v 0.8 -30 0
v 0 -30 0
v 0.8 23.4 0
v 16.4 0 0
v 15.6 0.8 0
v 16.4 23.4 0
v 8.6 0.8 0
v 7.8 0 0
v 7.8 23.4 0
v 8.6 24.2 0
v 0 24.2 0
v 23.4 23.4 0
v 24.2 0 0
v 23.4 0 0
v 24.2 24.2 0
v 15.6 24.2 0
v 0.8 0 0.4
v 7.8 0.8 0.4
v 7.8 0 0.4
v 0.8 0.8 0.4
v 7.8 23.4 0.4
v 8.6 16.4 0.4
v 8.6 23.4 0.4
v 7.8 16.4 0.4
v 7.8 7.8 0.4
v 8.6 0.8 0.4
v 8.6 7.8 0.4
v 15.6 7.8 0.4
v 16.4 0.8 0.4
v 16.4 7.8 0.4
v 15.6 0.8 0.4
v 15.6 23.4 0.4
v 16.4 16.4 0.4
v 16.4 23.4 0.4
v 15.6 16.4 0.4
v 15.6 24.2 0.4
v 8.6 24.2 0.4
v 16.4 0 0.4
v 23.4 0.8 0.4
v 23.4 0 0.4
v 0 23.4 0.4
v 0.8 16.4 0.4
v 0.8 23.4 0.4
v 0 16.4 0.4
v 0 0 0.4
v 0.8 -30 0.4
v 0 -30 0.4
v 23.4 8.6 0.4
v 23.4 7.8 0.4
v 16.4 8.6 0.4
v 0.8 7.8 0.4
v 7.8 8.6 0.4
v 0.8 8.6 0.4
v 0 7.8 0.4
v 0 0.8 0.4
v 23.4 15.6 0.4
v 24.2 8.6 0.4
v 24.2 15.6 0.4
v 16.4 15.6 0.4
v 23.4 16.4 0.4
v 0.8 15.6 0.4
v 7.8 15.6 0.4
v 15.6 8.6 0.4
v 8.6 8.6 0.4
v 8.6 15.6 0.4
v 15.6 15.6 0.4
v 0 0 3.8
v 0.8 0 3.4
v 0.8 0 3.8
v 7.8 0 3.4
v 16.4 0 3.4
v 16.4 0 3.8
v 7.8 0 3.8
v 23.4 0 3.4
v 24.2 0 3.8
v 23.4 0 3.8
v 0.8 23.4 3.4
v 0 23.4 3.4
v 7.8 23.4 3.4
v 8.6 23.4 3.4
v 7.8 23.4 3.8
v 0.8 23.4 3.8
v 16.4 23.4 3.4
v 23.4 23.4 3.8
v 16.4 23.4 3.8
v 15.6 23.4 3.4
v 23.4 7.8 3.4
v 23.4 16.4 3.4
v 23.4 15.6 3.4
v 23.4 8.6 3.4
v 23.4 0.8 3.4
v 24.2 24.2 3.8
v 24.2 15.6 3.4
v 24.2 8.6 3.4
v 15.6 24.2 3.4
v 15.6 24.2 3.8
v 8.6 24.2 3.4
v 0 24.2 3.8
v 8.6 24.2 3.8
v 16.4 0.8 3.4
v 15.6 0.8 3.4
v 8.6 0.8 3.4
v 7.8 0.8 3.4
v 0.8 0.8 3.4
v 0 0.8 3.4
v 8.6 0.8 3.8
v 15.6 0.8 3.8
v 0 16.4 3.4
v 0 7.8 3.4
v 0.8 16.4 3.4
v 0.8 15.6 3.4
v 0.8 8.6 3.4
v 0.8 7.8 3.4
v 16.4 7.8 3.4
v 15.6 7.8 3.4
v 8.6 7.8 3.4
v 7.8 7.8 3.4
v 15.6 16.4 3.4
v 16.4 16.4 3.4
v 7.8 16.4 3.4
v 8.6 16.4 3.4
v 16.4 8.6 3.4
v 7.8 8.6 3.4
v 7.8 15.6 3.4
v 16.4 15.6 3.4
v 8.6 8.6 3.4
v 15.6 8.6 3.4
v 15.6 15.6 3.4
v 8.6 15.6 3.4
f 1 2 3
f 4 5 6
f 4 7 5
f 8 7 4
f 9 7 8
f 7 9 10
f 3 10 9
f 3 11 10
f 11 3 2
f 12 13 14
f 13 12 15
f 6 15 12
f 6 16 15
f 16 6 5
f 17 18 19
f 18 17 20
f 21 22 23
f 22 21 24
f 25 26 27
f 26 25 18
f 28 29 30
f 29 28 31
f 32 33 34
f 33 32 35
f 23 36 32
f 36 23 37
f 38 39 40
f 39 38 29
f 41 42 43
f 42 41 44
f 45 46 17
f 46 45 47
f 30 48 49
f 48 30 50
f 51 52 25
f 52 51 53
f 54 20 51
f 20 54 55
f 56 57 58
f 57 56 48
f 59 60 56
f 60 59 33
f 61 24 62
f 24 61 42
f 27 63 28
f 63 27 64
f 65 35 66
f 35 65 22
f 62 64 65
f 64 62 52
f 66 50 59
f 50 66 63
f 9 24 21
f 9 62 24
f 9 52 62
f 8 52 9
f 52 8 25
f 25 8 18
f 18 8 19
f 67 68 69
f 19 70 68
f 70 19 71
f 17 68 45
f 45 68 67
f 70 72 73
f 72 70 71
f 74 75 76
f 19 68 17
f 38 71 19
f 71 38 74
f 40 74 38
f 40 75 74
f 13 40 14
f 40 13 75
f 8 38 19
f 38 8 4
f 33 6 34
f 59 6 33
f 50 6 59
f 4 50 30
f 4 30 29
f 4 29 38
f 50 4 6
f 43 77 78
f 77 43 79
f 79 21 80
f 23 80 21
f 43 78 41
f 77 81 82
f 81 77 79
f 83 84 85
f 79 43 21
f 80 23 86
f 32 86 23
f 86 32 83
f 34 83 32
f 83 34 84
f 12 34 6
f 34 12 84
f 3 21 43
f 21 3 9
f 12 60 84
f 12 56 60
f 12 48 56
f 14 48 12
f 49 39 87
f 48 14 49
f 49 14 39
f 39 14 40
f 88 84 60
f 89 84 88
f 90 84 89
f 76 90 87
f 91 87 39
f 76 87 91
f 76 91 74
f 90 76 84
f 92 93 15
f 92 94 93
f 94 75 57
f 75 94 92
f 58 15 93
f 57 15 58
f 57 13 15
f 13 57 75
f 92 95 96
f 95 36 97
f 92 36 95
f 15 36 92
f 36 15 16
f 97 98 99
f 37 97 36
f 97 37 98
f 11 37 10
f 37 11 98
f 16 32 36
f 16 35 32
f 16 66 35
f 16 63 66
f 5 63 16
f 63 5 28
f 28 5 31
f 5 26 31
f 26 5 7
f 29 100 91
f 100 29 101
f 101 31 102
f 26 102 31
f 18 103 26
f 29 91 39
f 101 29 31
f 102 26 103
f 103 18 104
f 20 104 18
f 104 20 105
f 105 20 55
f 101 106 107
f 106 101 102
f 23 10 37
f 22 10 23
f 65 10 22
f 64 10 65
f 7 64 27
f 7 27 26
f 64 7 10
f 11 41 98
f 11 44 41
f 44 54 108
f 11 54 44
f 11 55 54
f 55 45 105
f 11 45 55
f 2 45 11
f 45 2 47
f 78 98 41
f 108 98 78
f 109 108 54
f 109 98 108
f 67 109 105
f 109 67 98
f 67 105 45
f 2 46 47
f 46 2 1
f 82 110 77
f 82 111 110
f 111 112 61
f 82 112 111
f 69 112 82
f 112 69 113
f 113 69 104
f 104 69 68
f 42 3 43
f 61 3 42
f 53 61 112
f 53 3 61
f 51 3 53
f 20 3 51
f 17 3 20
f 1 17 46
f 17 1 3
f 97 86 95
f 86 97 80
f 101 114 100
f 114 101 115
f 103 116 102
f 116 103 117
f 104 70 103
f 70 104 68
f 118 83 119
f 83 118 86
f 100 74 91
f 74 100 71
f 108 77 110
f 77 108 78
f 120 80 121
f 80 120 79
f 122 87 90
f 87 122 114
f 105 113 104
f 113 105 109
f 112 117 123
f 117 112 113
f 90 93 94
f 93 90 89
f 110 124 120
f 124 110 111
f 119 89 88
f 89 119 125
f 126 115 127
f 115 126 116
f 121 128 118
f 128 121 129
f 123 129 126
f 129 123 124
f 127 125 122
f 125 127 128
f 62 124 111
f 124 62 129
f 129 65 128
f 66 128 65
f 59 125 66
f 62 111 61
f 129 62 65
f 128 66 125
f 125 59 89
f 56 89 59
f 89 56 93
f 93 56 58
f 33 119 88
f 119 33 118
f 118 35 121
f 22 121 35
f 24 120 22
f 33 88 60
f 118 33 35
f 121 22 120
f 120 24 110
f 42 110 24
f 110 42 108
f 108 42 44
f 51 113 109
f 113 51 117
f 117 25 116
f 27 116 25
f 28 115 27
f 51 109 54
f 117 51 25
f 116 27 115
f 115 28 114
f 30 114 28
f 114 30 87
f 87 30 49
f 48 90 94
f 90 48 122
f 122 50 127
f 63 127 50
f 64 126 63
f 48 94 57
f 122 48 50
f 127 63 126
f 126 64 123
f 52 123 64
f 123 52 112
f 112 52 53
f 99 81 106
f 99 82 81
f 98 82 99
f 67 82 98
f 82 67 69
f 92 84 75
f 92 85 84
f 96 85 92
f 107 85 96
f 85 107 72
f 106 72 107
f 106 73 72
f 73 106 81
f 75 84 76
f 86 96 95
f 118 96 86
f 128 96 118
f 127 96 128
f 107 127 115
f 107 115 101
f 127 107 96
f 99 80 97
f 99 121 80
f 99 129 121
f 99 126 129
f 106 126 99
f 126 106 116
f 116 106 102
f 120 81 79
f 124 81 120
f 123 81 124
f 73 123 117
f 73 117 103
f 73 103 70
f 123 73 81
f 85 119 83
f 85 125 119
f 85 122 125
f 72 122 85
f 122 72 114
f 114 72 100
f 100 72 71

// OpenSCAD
// file: ../../api/v3/reporting.scad
//////////////////////////////////////////////////////////////////////
// LibFile: reporting.scad
// Project: Grid Stack
// FileGroup: API v3 Reporting
// FileSummary: Console report for immutable direct and positive-gap coupons.
// Role: Records the exact environment, dimensions, support strategy, path
//       lengths, qualification status, and deposited-layer counts.
// Requires: API v3 indexes, mathematics, and path generator.
// Exports: report_structural_coupon_object().
//////////////////////////////////////////////////////////////////////

function _bridge_status3(span, process) =
    span <= process[PX3_BRIDGE_MAX]
        ? "within_owner_tested_limit"
        : "exploratory_beyond_owner_tested_limit";

module report_structural_coupon_object(object, report_level = "full") {
    material = object[SCO_MATERIAL];
    nozzle = object[SCO_NOZZLE];
    printer = object[SCO_PRINTER];
    process = object[SCO_PROCESS];
    boundary = object[SCO_BOUNDARY];
    gap = object[SCO_CLEAR_GAP];
    strategy = object[SCO_SUPPORT_STRATEGY];

    echo("--- Grid Stack immutable structural coupon ---");
    echo(str("Object: ", object[SCO_NAME], " revision ", object[SCO_REVISION]));
    echo(str("API/schema: ", object[SCO_REQUIRED_API], "/",
        object[SCO_SCHEMA_VERSION]));
    echo(str("Release/base commit: ", object[SCO_SOURCE_RELEASE], " / ",
        object[SCO_FRAMEWORK_BASE_COMMIT]));
    echo(str("Material/nozzle/printer: ", material[MAT3_FAMILY], " / ",
        nozzle[NZ3_DIAMETER], " mm / ", printer[PRN3_NAME]));
    echo(str("Cells: ", boundary[B3_CELLS_X], " x ", boundary[B3_CELLS_Y]));
    echo(str("Clear spans: ", boundary[B3_CLEAR_SPAN_X], " x ",
        boundary[B3_CLEAR_SPAN_Y], " mm"));
    echo(str("Span status: ",
        _bridge_status3(boundary[B3_CLEAR_SPAN_X], process)));
    echo(str("Outside size: ", boundary_size_x3(boundary, process, nozzle),
        " x ", boundary_size_y3(boundary, process, nozzle), " mm"));
    echo(str("Primitive trace: ", trace_width3(nozzle), " x ",
        trace_height3(process), " mm"));
    echo(str("Structural strand: ", strand_width3(process, nozzle), " x ",
        strand_height3(process), " mm"));
    echo(str("Clear vertical gap: ", gap, " mm"));
    echo(str("Support strategy: ", strategy));
    echo(str("Total modeled height: ", coupon_total_height3(object), " mm"));

    if (report_level == "full") {
        if (strategy == "direct_orthogonal") {
            lower = coupon_path(
                boundary, process, nozzle, 0, object[SCO_LEAD_IN]
            );
            upper = coupon_path(boundary, process, nozzle, 90, 0);
            echo(str("Lower/upper path lengths: ", path_length3(lower),
                " / ", path_length3(upper), " mm"));
            echo(str("Deposited layers: ", 2 * process[PX3_HEIGHT_PASSES]));
        }
        else {
            witness = coupon_path(
                boundary, process, nozzle, 90, object[SCO_LEAD_IN]
            );
            riser = coupon_path(boundary, process, nozzle, 0, 0);
            test = coupon_path(boundary, process, nozzle, 90, 0);
            echo(str("Witness/riser/test path lengths: ",
                path_length3(witness), " / ", path_length3(riser), " / ",
                path_length3(test), " mm"));
            echo(str("Riser deposited layers: ", round(gap_layer_count3(object))));
            echo(str("Total deposited layers: ",
                2 * process[PX3_HEIGHT_PASSES] +
                round(gap_layer_count3(object))));
        }
        echo(str("Status: ", object[SCO_STATUS]));
        echo(str("Notes: ", object[SCO_NOTES]));
    }
}
// file: ../../api/v3/validation.scad
//////////////////////////////////////////////////////////////////////
// LibFile: validation.scad
// Project: Grid Stack
// FileGroup: API v3 Validation
// FileSummary: Validates immutable environment records, count boundaries,
//              support strategy, path continuity, and layer quantization.
// Role: Rejects incompatible or physically floating recipes before geometry
//       is generated.
// Requires: API v3 indexes, mathematics, and path generator.
// Exports: validate_structural_coupon_object().
//////////////////////////////////////////////////////////////////////

module _validate_path3(points, boundary, orientation, lead_in) {
    run_count = orientation == 0
        ? boundary_strand_count_y3(boundary)
        : boundary_strand_count_x3(boundary);

    assert(len(points) == expected_coupon_point_count3(run_count, lead_in),
        "API v3 coupon path has an unexpected point count.");
    assert(!path_has_zero_segment3(points),
        "API v3 coupon path contains a zero-length segment.");
    assert(path_axis_aligned3(points),
        "API v3 coupon path must remain axis-aligned.");
    assert(points[0] != points[len(points) - 1],
        "API v3 coupon path must remain open.");
}

module validate_structural_coupon_object(object) {
    assert(object[SCO_REQUIRED_API] == GRID_STACK_API_VERSION,
        "Saved coupon requires a different Grid Stack API version.");
    assert(object[SCO_SCHEMA_VERSION] == GRID_STACK_COUPON_SCHEMA_VERSION,
        "Saved coupon requires a different coupon schema version.");
    assert(GRID_STACK_RECTANGULAR_FRAMEWORK_VERSION == 2,
        "Saved coupon requires rectangular framework version 2.");

    material = object[SCO_MATERIAL];
    nozzle = object[SCO_NOZZLE];
    printer = object[SCO_PRINTER];
    process = object[SCO_PROCESS];
    boundary = object[SCO_BOUNDARY];
    gap = object[SCO_CLEAR_GAP];
    lead_in = object[SCO_LEAD_IN];
    strategy = object[SCO_SUPPORT_STRATEGY];

    assert(nozzle[NZ3_DIAMETER] > 0,
        "Saved coupon nozzle diameter must be positive.");
    assert(process[PX3_LAYER_H] > 0,
        "Saved coupon layer height must be positive.");
    assert(process[PX3_WIDTH_PASSES] >= 2,
        "Saved coupon structural width requires at least two passes.");
    assert(process[PX3_HEIGHT_PASSES] >= 2,
        "Saved coupon structural height requires at least two layers.");
    assert(process[PX3_MATERIAL] == material[MAT3_NAME],
        "Saved coupon process/material references do not match.");
    assert(process[PX3_NOZZLE] == nozzle[NZ3_NAME],
        "Saved coupon process/nozzle references do not match.");
    assert(process[PX3_PRINTER] == printer[PRN3_NAME],
        "Saved coupon process/printer references do not match.");
    assert(boundary[B3_CELLS_X] > 0 && boundary[B3_CELLS_Y] > 0,
        "Saved coupon cell counts must be positive.");
    assert(boundary[B3_CLEAR_SPAN_X] > 0 &&
           boundary[B3_CLEAR_SPAN_Y] > 0,
        "Saved coupon clear spans must be positive.");
    assert(lead_in >= 0,
        "Saved coupon lead-in cannot be negative.");
    assert(gap >= 0,
        "Saved coupon clear gap cannot be negative.");
    assert(nearly_equal3(gap_layer_count3(object), round(gap_layer_count3(object))),
        "Saved coupon clear gap must equal a whole deposited-layer count.");
    assert(
        (strategy == "direct_orthogonal" && nearly_equal3(gap, 0)) ||
        (strategy == "witness_riser_bridge" && gap > 0),
        "Saved coupon support strategy does not match its clear gap."
    );

    if (strategy == "direct_orthogonal") {
        lower = coupon_path(boundary, process, nozzle, 0, lead_in);
        upper = coupon_path(boundary, process, nozzle, 90, 0);
        _validate_path3(lower, boundary, 0, lead_in);
        _validate_path3(upper, boundary, 90, 0);
        entry = lead_in > 0 ? 1 : 0;
        assert(nearly_equal3(point_distance_2d3(lower[entry], upper[0]), 0),
            "Direct upper path must start on the lower entry crossing.");
    }
    else {
        witness = coupon_path(boundary, process, nozzle, 90, lead_in);
        riser = coupon_path(boundary, process, nozzle, 0, 0);
        test = coupon_path(boundary, process, nozzle, 90, 0);
        _validate_path3(witness, boundary, 90, lead_in);
        _validate_path3(riser, boundary, 0, 0);
        _validate_path3(test, boundary, 90, 0);
        entry = lead_in > 0 ? 1 : 0;
        assert(nearly_equal3(point_distance_2d3(witness[entry], riser[0]), 0),
            "Riser path must start on the witness entry crossing.");
        assert(nearly_equal3(point_distance_2d3(riser[0], test[0]), 0),
            "Upper test path must start on the riser entry crossing.");
        for (i = [0 : len(test) - 1])
            assert(nearly_equal3(point_distance_2d3(test[i], witness[i + entry]), 0),
                "Upper test path must align directly above the witness path.");
    }

    echo("GRID STACK API V3 COUPON VALIDATION: PASS");
}
// file: ../../api/v3/geometry.scad
//////////////////////////////////////////////////////////////////////
// LibFile: geometry.scad
// Project: Grid Stack
// FileGroup: API v3 Printable Geometry
// FileSummary: Creates square-ended structural paths, direct-contact coupons,
//              positive witness/riser/bridge coupons, and simple diagnostics.
// Role: Supplies all geometry used by immutable API v3 recipes without
//       importing mutable workbench geometry.
// Requires: API v3 mathematics and ordered axis-aligned paths.
// Exports: render_direct_coupon(), render_positive_gap_coupon(), and
//          render_coupon_path_debug().
//////////////////////////////////////////////////////////////////////

module _segment_2d3(a, b, width) {
    horizontal = nearly_equal3(a[1], b[1]);
    vertical = nearly_equal3(a[0], b[0]);

    assert(horizontal || vertical,
        "API v3 printable segments must be horizontal or vertical.");
    assert(!nearly_equal3(point_distance_2d3(a, b), 0),
        "API v3 printable segments must have nonzero length.");

    if (horizontal)
        translate([min(a[0], b[0]) - width / 2, a[1] - width / 2])
            square([abs(b[0] - a[0]) + width, width]);
    else
        translate([a[0] - width / 2, min(a[1], b[1]) - width / 2])
            square([width, abs(b[1] - a[1]) + width]);
}

module _path_2d3(points, width) {
    union()
        for (i = [0 : len(points) - 2])
            _segment_2d3(points[i], points[i + 1], width);
}

module _structural_path3(points, process, nozzle) {
    linear_extrude(height = strand_height3(process), convexity = 10)
        _path_2d3(points, strand_width3(process, nozzle));
}

module render_direct_coupon(lower, upper, process, nozzle) {
    union() {
        _structural_path3(lower, process, nozzle);
        translate([0, 0, strand_height3(process)])
            _structural_path3(upper, process, nozzle);
    }
}

module render_positive_gap_coupon(
    witness, riser, test, process, nozzle, clear_gap
) {
    union() {
        _structural_path3(witness, process, nozzle);

        translate([0, 0, strand_height3(process)])
            linear_extrude(height = clear_gap, convexity = 10)
                _path_2d3(riser, strand_width3(process, nozzle));

        translate([0, 0, strand_height3(process) + clear_gap])
            _structural_path3(test, process, nozzle);
    }
}

module _debug_path3(points, z, width) {
    translate([0, 0, z])
        linear_extrude(height = 0.04)
            _path_2d3(points, width);
}

module render_coupon_path_debug(
    lower, upper, riser, process, clear_gap = 0
) {
    width = max(0.12, trace_height3(process));
    _debug_path3(lower, 0, width);
    if (len(riser) > 0)
        _debug_path3(riser, strand_height3(process), width);
    _debug_path3(
        upper,
        strand_height3(process) + clear_gap,
        width
    );
}
// file: ../../api/v3/paths.scad
//////////////////////////////////////////////////////////////////////
// LibFile: paths.scad
// Project: Grid Stack
// FileGroup: API v3 Path Generation
// FileSummary: Generates one open rectangular serpentine centerline from a
//              count boundary for X- or Y-running structural paths.
// Role: Preserves parallel runs, square connectors, optional single lead-in,
//       and one uninterrupted ordered point list per deposited layer.
// Requires: API v3 indexes and mathematics.
// Exports: coupon_path() and expected_coupon_point_count3().
//////////////////////////////////////////////////////////////////////

function _x_rows3(row, count, x_min, x_max, y_min, pitch) =
    row >= count
        ? []
        : let(
            y = y_min + row * pitch,
            x_end = row % 2 == 0 ? x_max : x_min,
            row_end = [x_end, y],
            connector_end = [x_end, y + pitch]
        )
        concat(
            [row_end],
            row < count - 1 ? [connector_end] : [],
            _x_rows3(row + 1, count, x_min, x_max, y_min, pitch)
        );

function _y_columns3(column, count, x_min, y_min, y_max, pitch) =
    column >= count
        ? []
        : let(
            x = x_min + column * pitch,
            y_end = column % 2 == 0 ? y_max : y_min,
            column_end = [x, y_end],
            connector_end = [x + pitch, y_end]
        )
        concat(
            [column_end],
            column < count - 1 ? [connector_end] : [],
            _y_columns3(column + 1, count, x_min, y_min, y_max, pitch)
        );

function expected_coupon_point_count3(run_count, lead_in = 0) =
    2 * run_count + (lead_in > 0 ? 1 : 0);

function coupon_path(
    boundary, process, nozzle, orientation = 0, lead_in = 0
) =
    assert(orientation == 0 || orientation == 90,
        "API v3 coupon orientation must be 0 or 90 degrees.")
    assert(lead_in >= 0,
        "API v3 coupon lead-in cannot be negative.")
    let(
        width = strand_width3(process, nozzle),
        x_min = width / 2,
        y_min = width / 2,
        x_max = boundary_size_x3(boundary, process, nozzle) - width / 2,
        y_max = boundary_size_y3(boundary, process, nozzle) - width / 2,
        entry = [x_min, y_min],
        prefix = lead_in > 0
            ? (orientation == 0
                ? [[x_min - lead_in, y_min], entry]
                : [[x_min, y_min - lead_in], entry])
            : [entry]
    )
    orientation == 0
        ? concat(
            prefix,
            _x_rows3(
                0, boundary_strand_count_y3(boundary),
                x_min, x_max, y_min,
                boundary_pitch_y3(boundary, process, nozzle)
            )
        )
        : concat(
            prefix,
            _y_columns3(
                0, boundary_strand_count_x3(boundary),
                x_min, y_min, y_max,
                boundary_pitch_x3(boundary, process, nozzle)
            )
        );
// file: ../../api/v3/math.scad
//////////////////////////////////////////////////////////////////////
// LibFile: math.scad
// Project: Grid Stack
// FileGroup: API v3 Mathematics
// FileSummary: Pure trace, strand, boundary, path, and layer-count helpers.
// Role: Keeps API v3 calculations isolated and reproducible without importing
//       mutable workbench mathematics.
// Requires: API v3 indexes.
// Exports: nearly_equal3(), trace/strand dimensions, boundary dimensions,
//          path inspection, gap-layer count, and total-height helpers.
//////////////////////////////////////////////////////////////////////

function nearly_equal3(a, b, epsilon = 0.000001) = abs(a - b) <= epsilon;

function trace_width3(nozzle) = nozzle[NZ3_DIAMETER];
function trace_height3(process) = process[PX3_LAYER_H];
function strand_width3(process, nozzle) =
    trace_width3(nozzle) * process[PX3_WIDTH_PASSES];
function strand_height3(process) =
    trace_height3(process) * process[PX3_HEIGHT_PASSES];

function boundary_strand_count_x3(boundary) = boundary[B3_CELLS_X] + 1;
function boundary_strand_count_y3(boundary) = boundary[B3_CELLS_Y] + 1;
function boundary_pitch_x3(boundary, process, nozzle) =
    boundary[B3_CLEAR_SPAN_X] + strand_width3(process, nozzle);
function boundary_pitch_y3(boundary, process, nozzle) =
    boundary[B3_CLEAR_SPAN_Y] + strand_width3(process, nozzle);
function boundary_size_x3(boundary, process, nozzle) =
    boundary[B3_CELLS_X] * boundary[B3_CLEAR_SPAN_X] +
    boundary_strand_count_x3(boundary) * strand_width3(process, nozzle);
function boundary_size_y3(boundary, process, nozzle) =
    boundary[B3_CELLS_Y] * boundary[B3_CLEAR_SPAN_Y] +
    boundary_strand_count_y3(boundary) * strand_width3(process, nozzle);

function point_distance_2d3(a, b) =
    sqrt(pow(b[0] - a[0], 2) + pow(b[1] - a[1], 2));
function path_length3(points, i = 0) =
    i >= len(points) - 1
        ? 0
        : point_distance_2d3(points[i], points[i + 1]) +
          path_length3(points, i + 1);
function path_has_zero_segment3(points, i = 0) =
    i >= len(points) - 1
        ? false
        : nearly_equal3(point_distance_2d3(points[i], points[i + 1]), 0)
            ? true
            : path_has_zero_segment3(points, i + 1);
function segment_axis_aligned3(a, b) =
    nearly_equal3(a[0], b[0]) || nearly_equal3(a[1], b[1]);
function path_axis_aligned3(points, i = 0) =
    i >= len(points) - 1
        ? true
        : segment_axis_aligned3(points[i], points[i + 1]) &&
          path_axis_aligned3(points, i + 1);

function gap_layer_count3(object) =
    object[SCO_CLEAR_GAP] / trace_height3(object[SCO_PROCESS]);
function coupon_total_height3(object) =
    2 * strand_height3(object[SCO_PROCESS]) + object[SCO_CLEAR_GAP];
// file: ../../api/v3/schema.scad
//////////////////////////////////////////////////////////////////////
// LibFile: schema.scad
// Project: Grid Stack
// FileGroup: API v3 Data Model
// FileSummary: Constructors for self-contained immutable structural coupons.
// Role: Makes every geometry-affecting environment and object value explicit
//       inside the saved recipe rather than resolving mutable catalog names.
// Exports: material_spec(), nozzle_spec(), printer_spec(),
//          structural_process_profile(), count_boundary(), and
//          structural_coupon_object().
//////////////////////////////////////////////////////////////////////

function material_spec(
    name, family, flexibility, status = "in_use", notes = ""
) = [name, family, flexibility, status, notes];

function nozzle_spec(
    name, diameter, construction = "brass", status = "in_use", notes = ""
) = [name, diameter, construction, status, notes];

function printer_spec(
    name,
    manufacturer = "",
    model = "",
    motion_system = "",
    build_surface = "",
    status = "unrecorded",
    notes = ""
) = [
    name, manufacturer, model, motion_system,
    build_surface, status, notes
];

function structural_process_profile(
    name,
    material_name,
    nozzle_name,
    printer_name,
    layer_height,
    width_passes,
    height_passes,
    bridge_max,
    qualification,
    revision,
    notes = ""
) = [
    name, material_name, nozzle_name, printer_name,
    layer_height, width_passes, height_passes, bridge_max,
    qualification, revision, notes
];

// Function: count_boundary()
// Synopsis: Stores clear-opening counts and clear spans for one rectangle.
function count_boundary(
    name,
    cells_x,
    cells_y,
    clear_span_x,
    clear_span_y,
    notes = ""
) = [name, cells_x, cells_y, clear_span_x, clear_span_y, notes];

// Function: structural_coupon_object()
// Synopsis: Constructs one permanent coupon recipe.
// Description:
//   framework_base_commit records the last accepted repository state used to
//   begin the API implementation. The Git commit containing this recipe is the
//   authoritative complete source; a file cannot embed its own future hash.
function structural_coupon_object(
    name,
    revision,
    required_api_version,
    coupon_schema_version,
    source_release,
    framework_base_commit,
    material,
    nozzle,
    printer,
    process,
    boundary,
    clear_vertical_gap,
    lead_in,
    support_strategy,
    status = "calibration",
    notes = ""
) = [
    name,
    revision,
    required_api_version,
    coupon_schema_version,
    source_release,
    framework_base_commit,
    material,
    nozzle,
    printer,
    process,
    boundary,
    clear_vertical_gap,
    lead_in,
    support_strategy,
    status,
    notes
];
// file: ../../api/v3/indices.scad
//////////////////////////////////////////////////////////////////////
// LibFile: indices.scad
// Project: Grid Stack
// FileGroup: API v3 Data Model
// FileSummary: Named indexes for immutable structural-coupon records.
// Role: Prevents unexplained numeric indexes from entering saved recipes and
//       keeps API version 3 independent of mutable workbench indexes.
// Exports: MAT3_*, NZ3_*, PRN3_*, PX3_*, B3_*, and SCO_* constants.
//////////////////////////////////////////////////////////////////////

MAT3_NAME = 0;
MAT3_FAMILY = 1;
MAT3_FLEXIBILITY = 2;
MAT3_STATUS = 3;
MAT3_NOTES = 4;

NZ3_NAME = 0;
NZ3_DIAMETER = 1;
NZ3_CONSTRUCTION = 2;
NZ3_STATUS = 3;
NZ3_NOTES = 4;

PRN3_NAME = 0;
PRN3_MANUFACTURER = 1;
PRN3_MODEL = 2;
PRN3_MOTION_SYSTEM = 3;
PRN3_BUILD_SURFACE = 4;
PRN3_STATUS = 5;
PRN3_NOTES = 6;

PX3_NAME = 0;
PX3_MATERIAL = 1;
PX3_NOZZLE = 2;
PX3_PRINTER = 3;
PX3_LAYER_H = 4;
PX3_WIDTH_PASSES = 5;
PX3_HEIGHT_PASSES = 6;
PX3_BRIDGE_MAX = 7;
PX3_QUALIFICATION = 8;
PX3_REVISION = 9;
PX3_NOTES = 10;

B3_NAME = 0;
B3_CELLS_X = 1;
B3_CELLS_Y = 2;
B3_CLEAR_SPAN_X = 3;
B3_CLEAR_SPAN_Y = 4;
B3_NOTES = 5;

SCO_NAME = 0;
SCO_REVISION = 1;
SCO_REQUIRED_API = 2;
SCO_SCHEMA_VERSION = 3;
SCO_SOURCE_RELEASE = 4;
SCO_FRAMEWORK_BASE_COMMIT = 5;
SCO_MATERIAL = 6;
SCO_NOZZLE = 7;
SCO_PRINTER = 8;
SCO_PROCESS = 9;
SCO_BOUNDARY = 10;
SCO_CLEAR_GAP = 11;
SCO_LEAD_IN = 12;
SCO_SUPPORT_STRATEGY = 13;
SCO_STATUS = 14;
SCO_NOTES = 15;
// file: ../../api/grid_stack_v3.scad
//////////////////////////////////////////////////////////////////////
// LibFile: grid_stack_v3.scad
// Project: Grid Stack
// FileGroup: Versioned Public Interface
// FileSummary: Immutable API version 3 for rectangular count-boundary
//              structural coupons, including positive witness/riser gaps.
// Role: Reconstructs saved coupon recipes without Customizer state or mutable
//       workbench catalogs. Incompatible behavior requires a new API file.
// Exports: API/schema constants, record constructors, validation, reporting,
//          and structural_coupon_render().
//////////////////////////////////////////////////////////////////////

GRID_STACK_API_VERSION = 3;
GRID_STACK_COUPON_SCHEMA_VERSION = 1;
GRID_STACK_RECTANGULAR_FRAMEWORK_VERSION = 2;
GRID_STACK_RELEASE = "1.0.0";

include <v3/indices.scad>
include <v3/schema.scad>
include <v3/math.scad>
include <v3/paths.scad>
include <v3/geometry.scad>
include <v3/validation.scad>
include <v3/reporting.scad>

// Module: structural_coupon_render()
// Synopsis: Validates, reports, and renders one immutable coupon recipe.
// Arguments:
//   object = Record returned by structural_coupon_object().
//   mode = print, path_debug, or report_only.
//   report_level = summary or full.
module structural_coupon_render(
    object,
    mode = "print",
    report_level = "full"
) {
    validate_structural_coupon_object(object);
    report_structural_coupon_object(object, report_level);

    boundary = object[SCO_BOUNDARY];
    process = object[SCO_PROCESS];
    nozzle = object[SCO_NOZZLE];
    lead_in = object[SCO_LEAD_IN];
    clear_gap = object[SCO_CLEAR_GAP];
    strategy = object[SCO_SUPPORT_STRATEGY];

    if (strategy == "direct_orthogonal") {
        lower = coupon_path(boundary, process, nozzle, 0, lead_in);
        upper = coupon_path(boundary, process, nozzle, 90, 0);

        if (mode == "print")
            render_direct_coupon(lower, upper, process, nozzle);
        else if (mode == "path_debug")
            render_coupon_path_debug(lower, upper, [], process);
        else if (mode == "report_only")
            echo("Grid Stack API v3 report-only mode: no geometry generated.");
        else
            assert(false, str("Unknown API v3 render mode: ", mode));
    }
    else if (strategy == "witness_riser_bridge") {
        witness = coupon_path(boundary, process, nozzle, 90, lead_in);
        riser = coupon_path(boundary, process, nozzle, 0, 0);
        test = coupon_path(boundary, process, nozzle, 90, 0);

        if (mode == "print")
            render_positive_gap_coupon(
                witness, riser, test, process, nozzle, clear_gap
            );
        else if (mode == "path_debug")
            render_coupon_path_debug(witness, test, riser, process, clear_gap);
        else if (mode == "report_only")
            echo("Grid Stack API v3 report-only mode: no geometry generated.");
        else
            assert(false, str("Unknown API v3 render mode: ", mode));
    }
    else
        assert(false, str("Unknown coupon support strategy: ", strategy));
}
// main file
//////////////////////////////////////////////////////////////////////
// LibFile: coupon-3x3-span7-gap3-pla-plus-0p4-v1.scad
// Project: Grid Stack
// FileGroup: Immutable Structural Coupon
// FileSummary: 3 x 3 PLA+ coupon with 7 mm clear XY spans and 3 mm
//              clear vertical gap using witness_riser_bridge geometry.
// Role: Permanently reconstructs one calibration object without Customizer
//       state or mutable workbench catalog lookup.
// FrameworkBaseCommit: 4b5e564
// Requires: Grid Stack API version 3 and coupon schema version 1.
// Output: Printable continuous-path structural coupon geometry.
//////////////////////////////////////////////////////////////////////

include <../../api/grid_stack_v3.scad>

assert(GRID_STACK_API_VERSION == 3,
    "This recipe requires Grid Stack API version 3.");
assert(GRID_STACK_COUPON_SCHEMA_VERSION == 1,
    "This recipe requires coupon schema version 1.");
assert(GRID_STACK_RECTANGULAR_FRAMEWORK_VERSION == 2,
    "This recipe requires rectangular framework version 2.");

saved_material = material_spec(
    name = "PLA_PLUS",
    family = "PLA+",
    flexibility = "rigid",
    status = "in_use",
    notes = "Exact material family selected for the coupon matrix."
);

saved_nozzle = nozzle_spec(
    name = "BRASS_0P4",
    diameter = 0.4,
    construction = "brass",
    status = "in_use",
    notes = "Nominal nozzle diameter used to derive the 0.8 mm strand width."
);

saved_printer = printer_spec(
    name = "UNRECORDED_PRINTER_R1",
    manufacturer = "",
    model = "",
    motion_system = "",
    build_surface = "",
    status = "unrecorded",
    notes = "Printer identity was not frozen with this coupon framework."
);

saved_process = structural_process_profile(
    name = "PLA_PLUS_0P4_LH0P2_W2_H2_R1",
    material_name = "PLA_PLUS",
    nozzle_name = "BRASS_0P4",
    printer_name = "UNRECORDED_PRINTER_R1",
    layer_height = 0.2,
    width_passes = 2,
    height_passes = 2,
    bridge_max = 6,
    qualification = "owner_tested_to_6mm",
    revision = 1,
    notes = "Primitive trace 0.4 x 0.2 mm; structural strand 0.8 x 0.4 mm."
);

saved_boundary = count_boundary(
    name = "COUNT_3X3_SPAN7",
    cells_x = 3,
    cells_y = 3,
    clear_span_x = 7,
    clear_span_y = 7,
    notes = "Outside dimensions derive from four strands and three clear openings."
);

saved_coupon = structural_coupon_object(
    name = "COUPON_3X3_SPAN7_GAP3_PLA_PLUS_0P4_V1",
    revision = 1,
    required_api_version = 3,
    coupon_schema_version = 1,
    source_release = "1.0.0",
    framework_base_commit = "4b5e564",
    material = saved_material,
    nozzle = saved_nozzle,
    printer = saved_printer,
    process = saved_process,
    boundary = saved_boundary,
    clear_vertical_gap = 3,
    lead_in = 30,
    support_strategy = "witness_riser_bridge",
    status = "calibration_unprinted",
    notes = "Calibration recipe generated from the frozen Batch 010 framework; record results in a new revision after printing."
);

structural_coupon_render(
    saved_coupon,
    mode = "print",
    report_level = "full"
);
